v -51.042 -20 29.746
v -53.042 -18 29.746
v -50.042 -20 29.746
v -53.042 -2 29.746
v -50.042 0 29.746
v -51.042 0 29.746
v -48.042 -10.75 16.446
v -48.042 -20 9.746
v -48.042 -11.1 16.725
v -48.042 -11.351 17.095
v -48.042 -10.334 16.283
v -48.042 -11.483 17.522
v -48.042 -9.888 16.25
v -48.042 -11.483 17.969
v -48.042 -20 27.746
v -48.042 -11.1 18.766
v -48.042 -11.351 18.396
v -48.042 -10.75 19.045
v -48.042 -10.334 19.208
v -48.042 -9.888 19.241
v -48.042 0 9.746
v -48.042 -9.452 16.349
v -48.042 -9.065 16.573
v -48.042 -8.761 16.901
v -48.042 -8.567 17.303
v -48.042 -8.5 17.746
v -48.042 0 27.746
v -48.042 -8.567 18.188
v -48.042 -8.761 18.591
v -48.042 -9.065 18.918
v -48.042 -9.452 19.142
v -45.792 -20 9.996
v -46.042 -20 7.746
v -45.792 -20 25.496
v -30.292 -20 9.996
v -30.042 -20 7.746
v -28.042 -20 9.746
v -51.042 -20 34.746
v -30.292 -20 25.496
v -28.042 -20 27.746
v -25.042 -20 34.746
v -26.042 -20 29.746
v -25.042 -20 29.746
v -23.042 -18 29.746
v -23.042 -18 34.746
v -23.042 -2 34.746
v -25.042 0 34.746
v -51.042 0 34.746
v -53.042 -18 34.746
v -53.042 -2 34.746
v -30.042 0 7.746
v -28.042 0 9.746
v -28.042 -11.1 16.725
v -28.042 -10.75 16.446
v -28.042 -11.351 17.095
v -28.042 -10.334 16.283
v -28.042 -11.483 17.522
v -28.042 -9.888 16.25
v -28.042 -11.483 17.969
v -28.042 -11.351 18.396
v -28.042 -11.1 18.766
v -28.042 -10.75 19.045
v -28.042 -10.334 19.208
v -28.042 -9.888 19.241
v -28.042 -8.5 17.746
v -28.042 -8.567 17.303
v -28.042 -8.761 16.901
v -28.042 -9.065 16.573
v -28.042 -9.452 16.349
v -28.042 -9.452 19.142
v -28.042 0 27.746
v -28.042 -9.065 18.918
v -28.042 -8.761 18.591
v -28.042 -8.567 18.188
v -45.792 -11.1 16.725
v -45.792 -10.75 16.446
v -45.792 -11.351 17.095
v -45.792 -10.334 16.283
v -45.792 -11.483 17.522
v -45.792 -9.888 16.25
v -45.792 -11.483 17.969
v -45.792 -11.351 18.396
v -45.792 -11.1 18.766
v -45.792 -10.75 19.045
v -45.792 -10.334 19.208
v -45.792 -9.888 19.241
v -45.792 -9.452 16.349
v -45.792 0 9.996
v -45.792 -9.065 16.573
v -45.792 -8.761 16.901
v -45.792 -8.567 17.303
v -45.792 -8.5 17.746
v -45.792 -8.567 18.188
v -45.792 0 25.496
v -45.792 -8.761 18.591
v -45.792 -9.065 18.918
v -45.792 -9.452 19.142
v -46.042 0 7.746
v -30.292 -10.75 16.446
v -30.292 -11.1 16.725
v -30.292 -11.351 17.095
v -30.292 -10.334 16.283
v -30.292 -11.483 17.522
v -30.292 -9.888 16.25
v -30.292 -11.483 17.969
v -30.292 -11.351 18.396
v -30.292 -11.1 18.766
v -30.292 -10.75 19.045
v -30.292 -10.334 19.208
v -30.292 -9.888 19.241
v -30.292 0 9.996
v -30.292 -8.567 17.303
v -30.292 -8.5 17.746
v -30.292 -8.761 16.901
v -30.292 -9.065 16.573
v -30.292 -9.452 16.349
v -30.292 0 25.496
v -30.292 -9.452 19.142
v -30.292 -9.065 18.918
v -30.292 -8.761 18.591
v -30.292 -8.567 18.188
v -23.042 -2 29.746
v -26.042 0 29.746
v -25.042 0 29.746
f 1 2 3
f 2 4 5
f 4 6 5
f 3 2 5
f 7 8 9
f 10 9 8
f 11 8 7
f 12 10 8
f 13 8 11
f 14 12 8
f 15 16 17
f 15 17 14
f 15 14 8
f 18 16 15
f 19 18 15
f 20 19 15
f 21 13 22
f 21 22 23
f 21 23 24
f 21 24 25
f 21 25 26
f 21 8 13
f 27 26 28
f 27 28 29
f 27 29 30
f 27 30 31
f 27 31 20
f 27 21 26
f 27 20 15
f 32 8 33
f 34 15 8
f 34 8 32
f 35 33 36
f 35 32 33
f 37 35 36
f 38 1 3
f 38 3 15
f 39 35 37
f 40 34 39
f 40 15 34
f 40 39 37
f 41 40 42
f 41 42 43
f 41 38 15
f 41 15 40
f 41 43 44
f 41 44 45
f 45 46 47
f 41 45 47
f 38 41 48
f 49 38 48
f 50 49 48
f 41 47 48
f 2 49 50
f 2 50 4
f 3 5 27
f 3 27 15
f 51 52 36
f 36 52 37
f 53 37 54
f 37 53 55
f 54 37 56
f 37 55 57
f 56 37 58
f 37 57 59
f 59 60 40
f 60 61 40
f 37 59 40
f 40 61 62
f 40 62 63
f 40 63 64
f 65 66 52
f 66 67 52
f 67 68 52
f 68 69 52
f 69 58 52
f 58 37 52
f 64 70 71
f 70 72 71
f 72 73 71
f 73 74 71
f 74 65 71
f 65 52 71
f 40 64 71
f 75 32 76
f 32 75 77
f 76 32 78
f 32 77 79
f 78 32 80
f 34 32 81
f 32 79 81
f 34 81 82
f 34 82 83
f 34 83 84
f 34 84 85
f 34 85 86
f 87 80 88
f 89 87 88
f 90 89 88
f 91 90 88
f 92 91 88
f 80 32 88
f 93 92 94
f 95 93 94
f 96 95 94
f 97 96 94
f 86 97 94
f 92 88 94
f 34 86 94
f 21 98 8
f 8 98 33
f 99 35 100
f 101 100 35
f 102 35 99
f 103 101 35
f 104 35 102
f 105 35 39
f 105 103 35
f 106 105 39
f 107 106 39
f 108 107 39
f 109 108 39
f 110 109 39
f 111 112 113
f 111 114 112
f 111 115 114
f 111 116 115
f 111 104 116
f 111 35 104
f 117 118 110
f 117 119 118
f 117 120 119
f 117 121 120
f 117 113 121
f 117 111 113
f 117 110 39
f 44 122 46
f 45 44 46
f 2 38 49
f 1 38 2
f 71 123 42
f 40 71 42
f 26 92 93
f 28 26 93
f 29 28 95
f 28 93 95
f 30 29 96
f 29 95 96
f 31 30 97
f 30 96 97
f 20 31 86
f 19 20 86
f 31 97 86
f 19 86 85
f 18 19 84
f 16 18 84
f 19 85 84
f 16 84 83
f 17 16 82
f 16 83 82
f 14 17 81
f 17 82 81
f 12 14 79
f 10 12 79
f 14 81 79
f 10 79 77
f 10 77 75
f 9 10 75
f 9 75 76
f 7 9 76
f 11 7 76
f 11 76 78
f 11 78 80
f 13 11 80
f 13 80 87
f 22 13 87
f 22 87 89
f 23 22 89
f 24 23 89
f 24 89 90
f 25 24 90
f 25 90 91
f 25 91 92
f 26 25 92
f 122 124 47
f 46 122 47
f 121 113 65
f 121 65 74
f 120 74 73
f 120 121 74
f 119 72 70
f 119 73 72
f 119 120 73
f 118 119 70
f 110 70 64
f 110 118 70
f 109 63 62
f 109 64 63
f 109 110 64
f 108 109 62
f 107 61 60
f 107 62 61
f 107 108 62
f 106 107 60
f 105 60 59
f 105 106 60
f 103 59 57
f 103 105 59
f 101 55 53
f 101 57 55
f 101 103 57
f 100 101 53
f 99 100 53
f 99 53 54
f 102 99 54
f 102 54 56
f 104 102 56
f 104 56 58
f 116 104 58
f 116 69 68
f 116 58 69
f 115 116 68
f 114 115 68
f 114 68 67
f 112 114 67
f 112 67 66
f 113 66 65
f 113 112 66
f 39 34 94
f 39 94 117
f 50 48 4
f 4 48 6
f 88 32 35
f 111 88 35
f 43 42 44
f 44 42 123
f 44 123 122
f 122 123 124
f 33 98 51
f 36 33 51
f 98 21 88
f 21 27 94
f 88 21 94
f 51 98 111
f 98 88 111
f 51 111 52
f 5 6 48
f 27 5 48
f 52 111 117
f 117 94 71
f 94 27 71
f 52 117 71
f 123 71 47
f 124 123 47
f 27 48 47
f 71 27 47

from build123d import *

# Parameters (mm, degrees)
F0_W          = 20
F0_H          = 22
F0_W_2        = 15.5
F0_H_2        = 15.5
F1_DEPTH      = 20
F2_SIZE       = 2
F3_R          = 1.5
F4_DEPTH      = 7.251
F4_DEPTH_BACK = 25


# Not quite as in the source:
# - a feature names something its author has since deleted; it is built from what else it names


with BuildPart() as f1:
    # F0 (on Front) → F1 (new body)
    with BuildSketch(Plane.XZ):
        with Locations((-38.0418774337, 18.7455339581)):
            Rectangle(F0_W, F0_H)
        with Locations((-38.0418774337, 17.7455339581)):
            Rectangle(F0_W_2, F0_H_2, mode=Mode.SUBTRACT)
        Polygon((-48.0418774337, 29.7455339581), (-28.0418774337, 29.7455339581), (-23.0418774337, 29.7455339581), (-23.0418774337, 34.7455339581), (-53.0418774337, 34.7455339581), (-53.0418774337, 29.7455339581), align=None)
    extrude(amount=F1_DEPTH)

    # F2
    f2_edges = [f1.edges().sort_by_distance(p)[0] for p in [
        (-28.041877, -10, 7.745534),
        (-48.041877, -10, 7.745534),
        (-48.041877, -10, 29.745534),
        (-28.041877, -10, 29.745534),
        (-23.041877, 0, 32.245534),
        (-53.041877, 0, 32.245534),
        (-53.041877, -20, 32.245534),
        (-23.041877, -20, 32.245534),
    ]]
    chamfer(f2_edges, length=F2_SIZE)

    # F3 (on face) → F4 (cut, two sides)
    with BuildSketch(Plane.YZ.offset(-45.7918774337)) as f4_sk:
        with Locations((-10, 17.7455339581)):
            Circle(F3_R)
    extrude(amount=-F4_DEPTH, mode=Mode.SUBTRACT)
    extrude(f4_sk.sketch, amount=F4_DEPTH_BACK, mode=Mode.SUBTRACT)


solid = f1.part
